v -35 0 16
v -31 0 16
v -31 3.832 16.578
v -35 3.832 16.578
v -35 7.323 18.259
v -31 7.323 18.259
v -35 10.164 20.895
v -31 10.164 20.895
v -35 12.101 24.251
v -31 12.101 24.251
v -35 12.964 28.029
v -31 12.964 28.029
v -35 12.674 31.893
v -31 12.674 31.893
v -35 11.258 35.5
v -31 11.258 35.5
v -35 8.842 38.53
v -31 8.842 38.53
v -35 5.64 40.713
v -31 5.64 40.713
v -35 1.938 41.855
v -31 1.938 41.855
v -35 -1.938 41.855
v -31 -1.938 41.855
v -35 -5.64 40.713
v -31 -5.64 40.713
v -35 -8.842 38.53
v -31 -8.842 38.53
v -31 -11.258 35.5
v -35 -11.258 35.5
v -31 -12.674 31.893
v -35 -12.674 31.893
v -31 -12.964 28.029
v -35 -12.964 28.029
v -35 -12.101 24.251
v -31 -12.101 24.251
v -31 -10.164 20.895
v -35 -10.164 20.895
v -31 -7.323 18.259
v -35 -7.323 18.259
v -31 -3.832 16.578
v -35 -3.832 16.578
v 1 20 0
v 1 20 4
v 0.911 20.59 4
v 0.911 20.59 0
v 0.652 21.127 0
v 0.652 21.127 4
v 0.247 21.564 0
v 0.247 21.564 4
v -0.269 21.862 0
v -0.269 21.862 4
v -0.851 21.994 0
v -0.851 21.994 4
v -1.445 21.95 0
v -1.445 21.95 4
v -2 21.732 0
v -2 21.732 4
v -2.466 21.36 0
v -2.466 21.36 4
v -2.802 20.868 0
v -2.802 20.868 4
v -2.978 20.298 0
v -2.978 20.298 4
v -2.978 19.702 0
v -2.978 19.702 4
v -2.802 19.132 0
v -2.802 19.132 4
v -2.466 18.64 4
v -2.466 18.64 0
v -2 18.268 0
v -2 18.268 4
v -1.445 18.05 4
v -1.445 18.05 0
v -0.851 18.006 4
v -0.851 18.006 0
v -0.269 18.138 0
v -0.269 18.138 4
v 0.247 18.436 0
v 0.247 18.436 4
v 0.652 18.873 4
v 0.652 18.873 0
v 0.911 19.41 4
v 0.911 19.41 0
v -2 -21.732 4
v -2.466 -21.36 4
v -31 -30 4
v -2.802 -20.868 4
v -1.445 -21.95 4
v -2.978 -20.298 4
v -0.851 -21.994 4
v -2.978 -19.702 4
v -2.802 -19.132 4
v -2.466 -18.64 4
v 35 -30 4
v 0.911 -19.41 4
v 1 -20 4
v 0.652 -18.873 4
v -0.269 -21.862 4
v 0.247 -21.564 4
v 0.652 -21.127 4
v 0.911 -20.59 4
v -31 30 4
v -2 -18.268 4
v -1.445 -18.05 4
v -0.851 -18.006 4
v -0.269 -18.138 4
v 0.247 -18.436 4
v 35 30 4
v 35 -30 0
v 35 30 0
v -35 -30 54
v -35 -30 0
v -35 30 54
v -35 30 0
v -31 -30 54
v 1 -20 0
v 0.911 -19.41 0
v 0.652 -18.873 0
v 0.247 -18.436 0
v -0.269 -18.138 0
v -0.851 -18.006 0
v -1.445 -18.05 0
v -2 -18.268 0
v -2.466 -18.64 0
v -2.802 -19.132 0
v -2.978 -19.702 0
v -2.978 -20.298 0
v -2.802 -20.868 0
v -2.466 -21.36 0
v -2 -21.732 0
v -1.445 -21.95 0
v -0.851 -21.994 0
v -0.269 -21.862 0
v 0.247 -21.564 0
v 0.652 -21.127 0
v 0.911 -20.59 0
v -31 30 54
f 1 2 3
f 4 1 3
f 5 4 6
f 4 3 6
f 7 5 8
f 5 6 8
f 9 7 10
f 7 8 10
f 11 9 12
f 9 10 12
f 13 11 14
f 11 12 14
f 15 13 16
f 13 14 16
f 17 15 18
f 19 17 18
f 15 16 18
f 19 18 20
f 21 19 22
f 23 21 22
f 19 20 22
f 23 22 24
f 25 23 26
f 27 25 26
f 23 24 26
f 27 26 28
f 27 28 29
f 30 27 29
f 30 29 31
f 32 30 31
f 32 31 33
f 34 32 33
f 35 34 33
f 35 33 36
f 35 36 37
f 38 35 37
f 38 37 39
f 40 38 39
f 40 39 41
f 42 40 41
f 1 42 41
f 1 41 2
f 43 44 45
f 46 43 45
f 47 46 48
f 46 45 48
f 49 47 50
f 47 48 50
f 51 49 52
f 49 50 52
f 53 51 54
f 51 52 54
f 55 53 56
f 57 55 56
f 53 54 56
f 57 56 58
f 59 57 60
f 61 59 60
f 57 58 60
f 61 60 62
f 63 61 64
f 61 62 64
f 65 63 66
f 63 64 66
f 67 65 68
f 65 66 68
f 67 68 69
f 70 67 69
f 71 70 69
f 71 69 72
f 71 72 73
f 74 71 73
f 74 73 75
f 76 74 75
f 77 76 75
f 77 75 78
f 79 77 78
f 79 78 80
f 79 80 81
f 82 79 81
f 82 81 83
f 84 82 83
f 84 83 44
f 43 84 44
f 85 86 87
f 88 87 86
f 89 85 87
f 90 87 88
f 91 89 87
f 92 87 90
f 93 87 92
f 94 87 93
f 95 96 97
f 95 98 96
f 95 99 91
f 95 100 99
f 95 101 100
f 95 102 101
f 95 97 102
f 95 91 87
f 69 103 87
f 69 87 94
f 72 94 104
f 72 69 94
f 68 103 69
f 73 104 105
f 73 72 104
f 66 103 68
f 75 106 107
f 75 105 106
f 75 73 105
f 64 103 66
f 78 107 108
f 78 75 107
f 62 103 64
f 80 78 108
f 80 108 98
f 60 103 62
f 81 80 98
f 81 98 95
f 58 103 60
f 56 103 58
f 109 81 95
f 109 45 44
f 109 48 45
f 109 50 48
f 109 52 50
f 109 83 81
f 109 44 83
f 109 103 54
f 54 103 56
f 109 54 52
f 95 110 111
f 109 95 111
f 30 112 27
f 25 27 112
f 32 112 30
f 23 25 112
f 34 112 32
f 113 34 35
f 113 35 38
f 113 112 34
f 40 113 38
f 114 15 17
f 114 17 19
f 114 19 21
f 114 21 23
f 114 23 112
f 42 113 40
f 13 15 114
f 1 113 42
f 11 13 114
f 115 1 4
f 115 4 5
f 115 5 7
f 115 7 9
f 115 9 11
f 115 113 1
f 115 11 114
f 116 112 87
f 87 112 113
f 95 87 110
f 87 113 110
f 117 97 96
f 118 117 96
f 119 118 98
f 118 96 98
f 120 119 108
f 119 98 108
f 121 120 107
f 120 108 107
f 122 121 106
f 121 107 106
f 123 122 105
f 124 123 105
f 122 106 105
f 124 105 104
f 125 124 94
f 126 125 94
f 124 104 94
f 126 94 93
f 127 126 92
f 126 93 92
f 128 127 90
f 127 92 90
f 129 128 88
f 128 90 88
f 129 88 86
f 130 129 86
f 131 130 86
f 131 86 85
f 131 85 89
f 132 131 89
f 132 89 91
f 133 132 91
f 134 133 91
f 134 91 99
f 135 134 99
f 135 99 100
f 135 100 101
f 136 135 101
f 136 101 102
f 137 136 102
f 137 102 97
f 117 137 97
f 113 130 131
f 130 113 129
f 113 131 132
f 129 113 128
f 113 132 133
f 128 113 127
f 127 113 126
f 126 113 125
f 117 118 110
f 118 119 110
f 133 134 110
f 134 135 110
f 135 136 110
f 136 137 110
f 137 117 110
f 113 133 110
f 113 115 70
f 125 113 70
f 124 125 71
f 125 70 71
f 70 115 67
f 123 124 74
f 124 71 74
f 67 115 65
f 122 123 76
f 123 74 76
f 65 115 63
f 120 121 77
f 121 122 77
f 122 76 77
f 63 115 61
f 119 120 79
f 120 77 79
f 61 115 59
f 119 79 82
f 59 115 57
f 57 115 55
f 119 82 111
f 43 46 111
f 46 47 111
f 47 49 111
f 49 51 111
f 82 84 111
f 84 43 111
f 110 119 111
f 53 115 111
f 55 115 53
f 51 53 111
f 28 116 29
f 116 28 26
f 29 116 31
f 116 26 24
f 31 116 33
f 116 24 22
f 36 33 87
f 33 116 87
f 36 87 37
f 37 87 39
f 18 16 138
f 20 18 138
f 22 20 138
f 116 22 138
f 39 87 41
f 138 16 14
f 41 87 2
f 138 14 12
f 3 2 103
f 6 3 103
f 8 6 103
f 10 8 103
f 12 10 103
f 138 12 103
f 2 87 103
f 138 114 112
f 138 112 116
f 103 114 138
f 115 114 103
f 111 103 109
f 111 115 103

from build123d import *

# Parameters (mm, degrees)
SKETCH1_W           = 70
SKETCH1_H           = 60
BOSS_EXTRUDE1_DEPTH = 4
SKETCH2_W           = 4
SKETCH2_H           = 60
BOSS_EXTRUDE2_DEPTH = 50
SKETCH3_R           = 13
CUT_EXTRUDE1_DEPTH  = 50
SKETCH4_R           = 2
CUT_EXTRUDE2_DEPTH  = 50


with BuildPart() as part:
    # Sketch1 → Boss-Extrude1 (new body)
    with BuildSketch(Plane.XY):
        Rectangle(SKETCH1_W, SKETCH1_H)
    extrude(amount=BOSS_EXTRUDE1_DEPTH)

    # Sketch2 → Boss-Extrude2 (add)
    with BuildSketch(Plane.XY.offset(4)):
        with Locations((-33, 0)):
            Rectangle(SKETCH2_W, SKETCH2_H)
    extrude(amount=BOSS_EXTRUDE2_DEPTH)

    # Sketch3 → Cut-Extrude1 (cut)
    with BuildSketch(Plane(origin=(-31, 0, 0), x_dir=(0, 0, -1), z_dir=(1, 0, 0))):
        with Locations((-29, 0)):
            Circle(SKETCH3_R)
    extrude(amount=-CUT_EXTRUDE1_DEPTH, mode=Mode.SUBTRACT)

    # Sketch4 → Cut-Extrude2 (cut)
    with BuildSketch(Plane.XY.offset(4)):
        with Locations((-1, 20)):
            Circle(SKETCH4_R)
        with Locations((-1, -20)):
            Circle(SKETCH4_R)
    extrude(amount=-CUT_EXTRUDE2_DEPTH, mode=Mode.SUBTRACT)


solid = part.part
